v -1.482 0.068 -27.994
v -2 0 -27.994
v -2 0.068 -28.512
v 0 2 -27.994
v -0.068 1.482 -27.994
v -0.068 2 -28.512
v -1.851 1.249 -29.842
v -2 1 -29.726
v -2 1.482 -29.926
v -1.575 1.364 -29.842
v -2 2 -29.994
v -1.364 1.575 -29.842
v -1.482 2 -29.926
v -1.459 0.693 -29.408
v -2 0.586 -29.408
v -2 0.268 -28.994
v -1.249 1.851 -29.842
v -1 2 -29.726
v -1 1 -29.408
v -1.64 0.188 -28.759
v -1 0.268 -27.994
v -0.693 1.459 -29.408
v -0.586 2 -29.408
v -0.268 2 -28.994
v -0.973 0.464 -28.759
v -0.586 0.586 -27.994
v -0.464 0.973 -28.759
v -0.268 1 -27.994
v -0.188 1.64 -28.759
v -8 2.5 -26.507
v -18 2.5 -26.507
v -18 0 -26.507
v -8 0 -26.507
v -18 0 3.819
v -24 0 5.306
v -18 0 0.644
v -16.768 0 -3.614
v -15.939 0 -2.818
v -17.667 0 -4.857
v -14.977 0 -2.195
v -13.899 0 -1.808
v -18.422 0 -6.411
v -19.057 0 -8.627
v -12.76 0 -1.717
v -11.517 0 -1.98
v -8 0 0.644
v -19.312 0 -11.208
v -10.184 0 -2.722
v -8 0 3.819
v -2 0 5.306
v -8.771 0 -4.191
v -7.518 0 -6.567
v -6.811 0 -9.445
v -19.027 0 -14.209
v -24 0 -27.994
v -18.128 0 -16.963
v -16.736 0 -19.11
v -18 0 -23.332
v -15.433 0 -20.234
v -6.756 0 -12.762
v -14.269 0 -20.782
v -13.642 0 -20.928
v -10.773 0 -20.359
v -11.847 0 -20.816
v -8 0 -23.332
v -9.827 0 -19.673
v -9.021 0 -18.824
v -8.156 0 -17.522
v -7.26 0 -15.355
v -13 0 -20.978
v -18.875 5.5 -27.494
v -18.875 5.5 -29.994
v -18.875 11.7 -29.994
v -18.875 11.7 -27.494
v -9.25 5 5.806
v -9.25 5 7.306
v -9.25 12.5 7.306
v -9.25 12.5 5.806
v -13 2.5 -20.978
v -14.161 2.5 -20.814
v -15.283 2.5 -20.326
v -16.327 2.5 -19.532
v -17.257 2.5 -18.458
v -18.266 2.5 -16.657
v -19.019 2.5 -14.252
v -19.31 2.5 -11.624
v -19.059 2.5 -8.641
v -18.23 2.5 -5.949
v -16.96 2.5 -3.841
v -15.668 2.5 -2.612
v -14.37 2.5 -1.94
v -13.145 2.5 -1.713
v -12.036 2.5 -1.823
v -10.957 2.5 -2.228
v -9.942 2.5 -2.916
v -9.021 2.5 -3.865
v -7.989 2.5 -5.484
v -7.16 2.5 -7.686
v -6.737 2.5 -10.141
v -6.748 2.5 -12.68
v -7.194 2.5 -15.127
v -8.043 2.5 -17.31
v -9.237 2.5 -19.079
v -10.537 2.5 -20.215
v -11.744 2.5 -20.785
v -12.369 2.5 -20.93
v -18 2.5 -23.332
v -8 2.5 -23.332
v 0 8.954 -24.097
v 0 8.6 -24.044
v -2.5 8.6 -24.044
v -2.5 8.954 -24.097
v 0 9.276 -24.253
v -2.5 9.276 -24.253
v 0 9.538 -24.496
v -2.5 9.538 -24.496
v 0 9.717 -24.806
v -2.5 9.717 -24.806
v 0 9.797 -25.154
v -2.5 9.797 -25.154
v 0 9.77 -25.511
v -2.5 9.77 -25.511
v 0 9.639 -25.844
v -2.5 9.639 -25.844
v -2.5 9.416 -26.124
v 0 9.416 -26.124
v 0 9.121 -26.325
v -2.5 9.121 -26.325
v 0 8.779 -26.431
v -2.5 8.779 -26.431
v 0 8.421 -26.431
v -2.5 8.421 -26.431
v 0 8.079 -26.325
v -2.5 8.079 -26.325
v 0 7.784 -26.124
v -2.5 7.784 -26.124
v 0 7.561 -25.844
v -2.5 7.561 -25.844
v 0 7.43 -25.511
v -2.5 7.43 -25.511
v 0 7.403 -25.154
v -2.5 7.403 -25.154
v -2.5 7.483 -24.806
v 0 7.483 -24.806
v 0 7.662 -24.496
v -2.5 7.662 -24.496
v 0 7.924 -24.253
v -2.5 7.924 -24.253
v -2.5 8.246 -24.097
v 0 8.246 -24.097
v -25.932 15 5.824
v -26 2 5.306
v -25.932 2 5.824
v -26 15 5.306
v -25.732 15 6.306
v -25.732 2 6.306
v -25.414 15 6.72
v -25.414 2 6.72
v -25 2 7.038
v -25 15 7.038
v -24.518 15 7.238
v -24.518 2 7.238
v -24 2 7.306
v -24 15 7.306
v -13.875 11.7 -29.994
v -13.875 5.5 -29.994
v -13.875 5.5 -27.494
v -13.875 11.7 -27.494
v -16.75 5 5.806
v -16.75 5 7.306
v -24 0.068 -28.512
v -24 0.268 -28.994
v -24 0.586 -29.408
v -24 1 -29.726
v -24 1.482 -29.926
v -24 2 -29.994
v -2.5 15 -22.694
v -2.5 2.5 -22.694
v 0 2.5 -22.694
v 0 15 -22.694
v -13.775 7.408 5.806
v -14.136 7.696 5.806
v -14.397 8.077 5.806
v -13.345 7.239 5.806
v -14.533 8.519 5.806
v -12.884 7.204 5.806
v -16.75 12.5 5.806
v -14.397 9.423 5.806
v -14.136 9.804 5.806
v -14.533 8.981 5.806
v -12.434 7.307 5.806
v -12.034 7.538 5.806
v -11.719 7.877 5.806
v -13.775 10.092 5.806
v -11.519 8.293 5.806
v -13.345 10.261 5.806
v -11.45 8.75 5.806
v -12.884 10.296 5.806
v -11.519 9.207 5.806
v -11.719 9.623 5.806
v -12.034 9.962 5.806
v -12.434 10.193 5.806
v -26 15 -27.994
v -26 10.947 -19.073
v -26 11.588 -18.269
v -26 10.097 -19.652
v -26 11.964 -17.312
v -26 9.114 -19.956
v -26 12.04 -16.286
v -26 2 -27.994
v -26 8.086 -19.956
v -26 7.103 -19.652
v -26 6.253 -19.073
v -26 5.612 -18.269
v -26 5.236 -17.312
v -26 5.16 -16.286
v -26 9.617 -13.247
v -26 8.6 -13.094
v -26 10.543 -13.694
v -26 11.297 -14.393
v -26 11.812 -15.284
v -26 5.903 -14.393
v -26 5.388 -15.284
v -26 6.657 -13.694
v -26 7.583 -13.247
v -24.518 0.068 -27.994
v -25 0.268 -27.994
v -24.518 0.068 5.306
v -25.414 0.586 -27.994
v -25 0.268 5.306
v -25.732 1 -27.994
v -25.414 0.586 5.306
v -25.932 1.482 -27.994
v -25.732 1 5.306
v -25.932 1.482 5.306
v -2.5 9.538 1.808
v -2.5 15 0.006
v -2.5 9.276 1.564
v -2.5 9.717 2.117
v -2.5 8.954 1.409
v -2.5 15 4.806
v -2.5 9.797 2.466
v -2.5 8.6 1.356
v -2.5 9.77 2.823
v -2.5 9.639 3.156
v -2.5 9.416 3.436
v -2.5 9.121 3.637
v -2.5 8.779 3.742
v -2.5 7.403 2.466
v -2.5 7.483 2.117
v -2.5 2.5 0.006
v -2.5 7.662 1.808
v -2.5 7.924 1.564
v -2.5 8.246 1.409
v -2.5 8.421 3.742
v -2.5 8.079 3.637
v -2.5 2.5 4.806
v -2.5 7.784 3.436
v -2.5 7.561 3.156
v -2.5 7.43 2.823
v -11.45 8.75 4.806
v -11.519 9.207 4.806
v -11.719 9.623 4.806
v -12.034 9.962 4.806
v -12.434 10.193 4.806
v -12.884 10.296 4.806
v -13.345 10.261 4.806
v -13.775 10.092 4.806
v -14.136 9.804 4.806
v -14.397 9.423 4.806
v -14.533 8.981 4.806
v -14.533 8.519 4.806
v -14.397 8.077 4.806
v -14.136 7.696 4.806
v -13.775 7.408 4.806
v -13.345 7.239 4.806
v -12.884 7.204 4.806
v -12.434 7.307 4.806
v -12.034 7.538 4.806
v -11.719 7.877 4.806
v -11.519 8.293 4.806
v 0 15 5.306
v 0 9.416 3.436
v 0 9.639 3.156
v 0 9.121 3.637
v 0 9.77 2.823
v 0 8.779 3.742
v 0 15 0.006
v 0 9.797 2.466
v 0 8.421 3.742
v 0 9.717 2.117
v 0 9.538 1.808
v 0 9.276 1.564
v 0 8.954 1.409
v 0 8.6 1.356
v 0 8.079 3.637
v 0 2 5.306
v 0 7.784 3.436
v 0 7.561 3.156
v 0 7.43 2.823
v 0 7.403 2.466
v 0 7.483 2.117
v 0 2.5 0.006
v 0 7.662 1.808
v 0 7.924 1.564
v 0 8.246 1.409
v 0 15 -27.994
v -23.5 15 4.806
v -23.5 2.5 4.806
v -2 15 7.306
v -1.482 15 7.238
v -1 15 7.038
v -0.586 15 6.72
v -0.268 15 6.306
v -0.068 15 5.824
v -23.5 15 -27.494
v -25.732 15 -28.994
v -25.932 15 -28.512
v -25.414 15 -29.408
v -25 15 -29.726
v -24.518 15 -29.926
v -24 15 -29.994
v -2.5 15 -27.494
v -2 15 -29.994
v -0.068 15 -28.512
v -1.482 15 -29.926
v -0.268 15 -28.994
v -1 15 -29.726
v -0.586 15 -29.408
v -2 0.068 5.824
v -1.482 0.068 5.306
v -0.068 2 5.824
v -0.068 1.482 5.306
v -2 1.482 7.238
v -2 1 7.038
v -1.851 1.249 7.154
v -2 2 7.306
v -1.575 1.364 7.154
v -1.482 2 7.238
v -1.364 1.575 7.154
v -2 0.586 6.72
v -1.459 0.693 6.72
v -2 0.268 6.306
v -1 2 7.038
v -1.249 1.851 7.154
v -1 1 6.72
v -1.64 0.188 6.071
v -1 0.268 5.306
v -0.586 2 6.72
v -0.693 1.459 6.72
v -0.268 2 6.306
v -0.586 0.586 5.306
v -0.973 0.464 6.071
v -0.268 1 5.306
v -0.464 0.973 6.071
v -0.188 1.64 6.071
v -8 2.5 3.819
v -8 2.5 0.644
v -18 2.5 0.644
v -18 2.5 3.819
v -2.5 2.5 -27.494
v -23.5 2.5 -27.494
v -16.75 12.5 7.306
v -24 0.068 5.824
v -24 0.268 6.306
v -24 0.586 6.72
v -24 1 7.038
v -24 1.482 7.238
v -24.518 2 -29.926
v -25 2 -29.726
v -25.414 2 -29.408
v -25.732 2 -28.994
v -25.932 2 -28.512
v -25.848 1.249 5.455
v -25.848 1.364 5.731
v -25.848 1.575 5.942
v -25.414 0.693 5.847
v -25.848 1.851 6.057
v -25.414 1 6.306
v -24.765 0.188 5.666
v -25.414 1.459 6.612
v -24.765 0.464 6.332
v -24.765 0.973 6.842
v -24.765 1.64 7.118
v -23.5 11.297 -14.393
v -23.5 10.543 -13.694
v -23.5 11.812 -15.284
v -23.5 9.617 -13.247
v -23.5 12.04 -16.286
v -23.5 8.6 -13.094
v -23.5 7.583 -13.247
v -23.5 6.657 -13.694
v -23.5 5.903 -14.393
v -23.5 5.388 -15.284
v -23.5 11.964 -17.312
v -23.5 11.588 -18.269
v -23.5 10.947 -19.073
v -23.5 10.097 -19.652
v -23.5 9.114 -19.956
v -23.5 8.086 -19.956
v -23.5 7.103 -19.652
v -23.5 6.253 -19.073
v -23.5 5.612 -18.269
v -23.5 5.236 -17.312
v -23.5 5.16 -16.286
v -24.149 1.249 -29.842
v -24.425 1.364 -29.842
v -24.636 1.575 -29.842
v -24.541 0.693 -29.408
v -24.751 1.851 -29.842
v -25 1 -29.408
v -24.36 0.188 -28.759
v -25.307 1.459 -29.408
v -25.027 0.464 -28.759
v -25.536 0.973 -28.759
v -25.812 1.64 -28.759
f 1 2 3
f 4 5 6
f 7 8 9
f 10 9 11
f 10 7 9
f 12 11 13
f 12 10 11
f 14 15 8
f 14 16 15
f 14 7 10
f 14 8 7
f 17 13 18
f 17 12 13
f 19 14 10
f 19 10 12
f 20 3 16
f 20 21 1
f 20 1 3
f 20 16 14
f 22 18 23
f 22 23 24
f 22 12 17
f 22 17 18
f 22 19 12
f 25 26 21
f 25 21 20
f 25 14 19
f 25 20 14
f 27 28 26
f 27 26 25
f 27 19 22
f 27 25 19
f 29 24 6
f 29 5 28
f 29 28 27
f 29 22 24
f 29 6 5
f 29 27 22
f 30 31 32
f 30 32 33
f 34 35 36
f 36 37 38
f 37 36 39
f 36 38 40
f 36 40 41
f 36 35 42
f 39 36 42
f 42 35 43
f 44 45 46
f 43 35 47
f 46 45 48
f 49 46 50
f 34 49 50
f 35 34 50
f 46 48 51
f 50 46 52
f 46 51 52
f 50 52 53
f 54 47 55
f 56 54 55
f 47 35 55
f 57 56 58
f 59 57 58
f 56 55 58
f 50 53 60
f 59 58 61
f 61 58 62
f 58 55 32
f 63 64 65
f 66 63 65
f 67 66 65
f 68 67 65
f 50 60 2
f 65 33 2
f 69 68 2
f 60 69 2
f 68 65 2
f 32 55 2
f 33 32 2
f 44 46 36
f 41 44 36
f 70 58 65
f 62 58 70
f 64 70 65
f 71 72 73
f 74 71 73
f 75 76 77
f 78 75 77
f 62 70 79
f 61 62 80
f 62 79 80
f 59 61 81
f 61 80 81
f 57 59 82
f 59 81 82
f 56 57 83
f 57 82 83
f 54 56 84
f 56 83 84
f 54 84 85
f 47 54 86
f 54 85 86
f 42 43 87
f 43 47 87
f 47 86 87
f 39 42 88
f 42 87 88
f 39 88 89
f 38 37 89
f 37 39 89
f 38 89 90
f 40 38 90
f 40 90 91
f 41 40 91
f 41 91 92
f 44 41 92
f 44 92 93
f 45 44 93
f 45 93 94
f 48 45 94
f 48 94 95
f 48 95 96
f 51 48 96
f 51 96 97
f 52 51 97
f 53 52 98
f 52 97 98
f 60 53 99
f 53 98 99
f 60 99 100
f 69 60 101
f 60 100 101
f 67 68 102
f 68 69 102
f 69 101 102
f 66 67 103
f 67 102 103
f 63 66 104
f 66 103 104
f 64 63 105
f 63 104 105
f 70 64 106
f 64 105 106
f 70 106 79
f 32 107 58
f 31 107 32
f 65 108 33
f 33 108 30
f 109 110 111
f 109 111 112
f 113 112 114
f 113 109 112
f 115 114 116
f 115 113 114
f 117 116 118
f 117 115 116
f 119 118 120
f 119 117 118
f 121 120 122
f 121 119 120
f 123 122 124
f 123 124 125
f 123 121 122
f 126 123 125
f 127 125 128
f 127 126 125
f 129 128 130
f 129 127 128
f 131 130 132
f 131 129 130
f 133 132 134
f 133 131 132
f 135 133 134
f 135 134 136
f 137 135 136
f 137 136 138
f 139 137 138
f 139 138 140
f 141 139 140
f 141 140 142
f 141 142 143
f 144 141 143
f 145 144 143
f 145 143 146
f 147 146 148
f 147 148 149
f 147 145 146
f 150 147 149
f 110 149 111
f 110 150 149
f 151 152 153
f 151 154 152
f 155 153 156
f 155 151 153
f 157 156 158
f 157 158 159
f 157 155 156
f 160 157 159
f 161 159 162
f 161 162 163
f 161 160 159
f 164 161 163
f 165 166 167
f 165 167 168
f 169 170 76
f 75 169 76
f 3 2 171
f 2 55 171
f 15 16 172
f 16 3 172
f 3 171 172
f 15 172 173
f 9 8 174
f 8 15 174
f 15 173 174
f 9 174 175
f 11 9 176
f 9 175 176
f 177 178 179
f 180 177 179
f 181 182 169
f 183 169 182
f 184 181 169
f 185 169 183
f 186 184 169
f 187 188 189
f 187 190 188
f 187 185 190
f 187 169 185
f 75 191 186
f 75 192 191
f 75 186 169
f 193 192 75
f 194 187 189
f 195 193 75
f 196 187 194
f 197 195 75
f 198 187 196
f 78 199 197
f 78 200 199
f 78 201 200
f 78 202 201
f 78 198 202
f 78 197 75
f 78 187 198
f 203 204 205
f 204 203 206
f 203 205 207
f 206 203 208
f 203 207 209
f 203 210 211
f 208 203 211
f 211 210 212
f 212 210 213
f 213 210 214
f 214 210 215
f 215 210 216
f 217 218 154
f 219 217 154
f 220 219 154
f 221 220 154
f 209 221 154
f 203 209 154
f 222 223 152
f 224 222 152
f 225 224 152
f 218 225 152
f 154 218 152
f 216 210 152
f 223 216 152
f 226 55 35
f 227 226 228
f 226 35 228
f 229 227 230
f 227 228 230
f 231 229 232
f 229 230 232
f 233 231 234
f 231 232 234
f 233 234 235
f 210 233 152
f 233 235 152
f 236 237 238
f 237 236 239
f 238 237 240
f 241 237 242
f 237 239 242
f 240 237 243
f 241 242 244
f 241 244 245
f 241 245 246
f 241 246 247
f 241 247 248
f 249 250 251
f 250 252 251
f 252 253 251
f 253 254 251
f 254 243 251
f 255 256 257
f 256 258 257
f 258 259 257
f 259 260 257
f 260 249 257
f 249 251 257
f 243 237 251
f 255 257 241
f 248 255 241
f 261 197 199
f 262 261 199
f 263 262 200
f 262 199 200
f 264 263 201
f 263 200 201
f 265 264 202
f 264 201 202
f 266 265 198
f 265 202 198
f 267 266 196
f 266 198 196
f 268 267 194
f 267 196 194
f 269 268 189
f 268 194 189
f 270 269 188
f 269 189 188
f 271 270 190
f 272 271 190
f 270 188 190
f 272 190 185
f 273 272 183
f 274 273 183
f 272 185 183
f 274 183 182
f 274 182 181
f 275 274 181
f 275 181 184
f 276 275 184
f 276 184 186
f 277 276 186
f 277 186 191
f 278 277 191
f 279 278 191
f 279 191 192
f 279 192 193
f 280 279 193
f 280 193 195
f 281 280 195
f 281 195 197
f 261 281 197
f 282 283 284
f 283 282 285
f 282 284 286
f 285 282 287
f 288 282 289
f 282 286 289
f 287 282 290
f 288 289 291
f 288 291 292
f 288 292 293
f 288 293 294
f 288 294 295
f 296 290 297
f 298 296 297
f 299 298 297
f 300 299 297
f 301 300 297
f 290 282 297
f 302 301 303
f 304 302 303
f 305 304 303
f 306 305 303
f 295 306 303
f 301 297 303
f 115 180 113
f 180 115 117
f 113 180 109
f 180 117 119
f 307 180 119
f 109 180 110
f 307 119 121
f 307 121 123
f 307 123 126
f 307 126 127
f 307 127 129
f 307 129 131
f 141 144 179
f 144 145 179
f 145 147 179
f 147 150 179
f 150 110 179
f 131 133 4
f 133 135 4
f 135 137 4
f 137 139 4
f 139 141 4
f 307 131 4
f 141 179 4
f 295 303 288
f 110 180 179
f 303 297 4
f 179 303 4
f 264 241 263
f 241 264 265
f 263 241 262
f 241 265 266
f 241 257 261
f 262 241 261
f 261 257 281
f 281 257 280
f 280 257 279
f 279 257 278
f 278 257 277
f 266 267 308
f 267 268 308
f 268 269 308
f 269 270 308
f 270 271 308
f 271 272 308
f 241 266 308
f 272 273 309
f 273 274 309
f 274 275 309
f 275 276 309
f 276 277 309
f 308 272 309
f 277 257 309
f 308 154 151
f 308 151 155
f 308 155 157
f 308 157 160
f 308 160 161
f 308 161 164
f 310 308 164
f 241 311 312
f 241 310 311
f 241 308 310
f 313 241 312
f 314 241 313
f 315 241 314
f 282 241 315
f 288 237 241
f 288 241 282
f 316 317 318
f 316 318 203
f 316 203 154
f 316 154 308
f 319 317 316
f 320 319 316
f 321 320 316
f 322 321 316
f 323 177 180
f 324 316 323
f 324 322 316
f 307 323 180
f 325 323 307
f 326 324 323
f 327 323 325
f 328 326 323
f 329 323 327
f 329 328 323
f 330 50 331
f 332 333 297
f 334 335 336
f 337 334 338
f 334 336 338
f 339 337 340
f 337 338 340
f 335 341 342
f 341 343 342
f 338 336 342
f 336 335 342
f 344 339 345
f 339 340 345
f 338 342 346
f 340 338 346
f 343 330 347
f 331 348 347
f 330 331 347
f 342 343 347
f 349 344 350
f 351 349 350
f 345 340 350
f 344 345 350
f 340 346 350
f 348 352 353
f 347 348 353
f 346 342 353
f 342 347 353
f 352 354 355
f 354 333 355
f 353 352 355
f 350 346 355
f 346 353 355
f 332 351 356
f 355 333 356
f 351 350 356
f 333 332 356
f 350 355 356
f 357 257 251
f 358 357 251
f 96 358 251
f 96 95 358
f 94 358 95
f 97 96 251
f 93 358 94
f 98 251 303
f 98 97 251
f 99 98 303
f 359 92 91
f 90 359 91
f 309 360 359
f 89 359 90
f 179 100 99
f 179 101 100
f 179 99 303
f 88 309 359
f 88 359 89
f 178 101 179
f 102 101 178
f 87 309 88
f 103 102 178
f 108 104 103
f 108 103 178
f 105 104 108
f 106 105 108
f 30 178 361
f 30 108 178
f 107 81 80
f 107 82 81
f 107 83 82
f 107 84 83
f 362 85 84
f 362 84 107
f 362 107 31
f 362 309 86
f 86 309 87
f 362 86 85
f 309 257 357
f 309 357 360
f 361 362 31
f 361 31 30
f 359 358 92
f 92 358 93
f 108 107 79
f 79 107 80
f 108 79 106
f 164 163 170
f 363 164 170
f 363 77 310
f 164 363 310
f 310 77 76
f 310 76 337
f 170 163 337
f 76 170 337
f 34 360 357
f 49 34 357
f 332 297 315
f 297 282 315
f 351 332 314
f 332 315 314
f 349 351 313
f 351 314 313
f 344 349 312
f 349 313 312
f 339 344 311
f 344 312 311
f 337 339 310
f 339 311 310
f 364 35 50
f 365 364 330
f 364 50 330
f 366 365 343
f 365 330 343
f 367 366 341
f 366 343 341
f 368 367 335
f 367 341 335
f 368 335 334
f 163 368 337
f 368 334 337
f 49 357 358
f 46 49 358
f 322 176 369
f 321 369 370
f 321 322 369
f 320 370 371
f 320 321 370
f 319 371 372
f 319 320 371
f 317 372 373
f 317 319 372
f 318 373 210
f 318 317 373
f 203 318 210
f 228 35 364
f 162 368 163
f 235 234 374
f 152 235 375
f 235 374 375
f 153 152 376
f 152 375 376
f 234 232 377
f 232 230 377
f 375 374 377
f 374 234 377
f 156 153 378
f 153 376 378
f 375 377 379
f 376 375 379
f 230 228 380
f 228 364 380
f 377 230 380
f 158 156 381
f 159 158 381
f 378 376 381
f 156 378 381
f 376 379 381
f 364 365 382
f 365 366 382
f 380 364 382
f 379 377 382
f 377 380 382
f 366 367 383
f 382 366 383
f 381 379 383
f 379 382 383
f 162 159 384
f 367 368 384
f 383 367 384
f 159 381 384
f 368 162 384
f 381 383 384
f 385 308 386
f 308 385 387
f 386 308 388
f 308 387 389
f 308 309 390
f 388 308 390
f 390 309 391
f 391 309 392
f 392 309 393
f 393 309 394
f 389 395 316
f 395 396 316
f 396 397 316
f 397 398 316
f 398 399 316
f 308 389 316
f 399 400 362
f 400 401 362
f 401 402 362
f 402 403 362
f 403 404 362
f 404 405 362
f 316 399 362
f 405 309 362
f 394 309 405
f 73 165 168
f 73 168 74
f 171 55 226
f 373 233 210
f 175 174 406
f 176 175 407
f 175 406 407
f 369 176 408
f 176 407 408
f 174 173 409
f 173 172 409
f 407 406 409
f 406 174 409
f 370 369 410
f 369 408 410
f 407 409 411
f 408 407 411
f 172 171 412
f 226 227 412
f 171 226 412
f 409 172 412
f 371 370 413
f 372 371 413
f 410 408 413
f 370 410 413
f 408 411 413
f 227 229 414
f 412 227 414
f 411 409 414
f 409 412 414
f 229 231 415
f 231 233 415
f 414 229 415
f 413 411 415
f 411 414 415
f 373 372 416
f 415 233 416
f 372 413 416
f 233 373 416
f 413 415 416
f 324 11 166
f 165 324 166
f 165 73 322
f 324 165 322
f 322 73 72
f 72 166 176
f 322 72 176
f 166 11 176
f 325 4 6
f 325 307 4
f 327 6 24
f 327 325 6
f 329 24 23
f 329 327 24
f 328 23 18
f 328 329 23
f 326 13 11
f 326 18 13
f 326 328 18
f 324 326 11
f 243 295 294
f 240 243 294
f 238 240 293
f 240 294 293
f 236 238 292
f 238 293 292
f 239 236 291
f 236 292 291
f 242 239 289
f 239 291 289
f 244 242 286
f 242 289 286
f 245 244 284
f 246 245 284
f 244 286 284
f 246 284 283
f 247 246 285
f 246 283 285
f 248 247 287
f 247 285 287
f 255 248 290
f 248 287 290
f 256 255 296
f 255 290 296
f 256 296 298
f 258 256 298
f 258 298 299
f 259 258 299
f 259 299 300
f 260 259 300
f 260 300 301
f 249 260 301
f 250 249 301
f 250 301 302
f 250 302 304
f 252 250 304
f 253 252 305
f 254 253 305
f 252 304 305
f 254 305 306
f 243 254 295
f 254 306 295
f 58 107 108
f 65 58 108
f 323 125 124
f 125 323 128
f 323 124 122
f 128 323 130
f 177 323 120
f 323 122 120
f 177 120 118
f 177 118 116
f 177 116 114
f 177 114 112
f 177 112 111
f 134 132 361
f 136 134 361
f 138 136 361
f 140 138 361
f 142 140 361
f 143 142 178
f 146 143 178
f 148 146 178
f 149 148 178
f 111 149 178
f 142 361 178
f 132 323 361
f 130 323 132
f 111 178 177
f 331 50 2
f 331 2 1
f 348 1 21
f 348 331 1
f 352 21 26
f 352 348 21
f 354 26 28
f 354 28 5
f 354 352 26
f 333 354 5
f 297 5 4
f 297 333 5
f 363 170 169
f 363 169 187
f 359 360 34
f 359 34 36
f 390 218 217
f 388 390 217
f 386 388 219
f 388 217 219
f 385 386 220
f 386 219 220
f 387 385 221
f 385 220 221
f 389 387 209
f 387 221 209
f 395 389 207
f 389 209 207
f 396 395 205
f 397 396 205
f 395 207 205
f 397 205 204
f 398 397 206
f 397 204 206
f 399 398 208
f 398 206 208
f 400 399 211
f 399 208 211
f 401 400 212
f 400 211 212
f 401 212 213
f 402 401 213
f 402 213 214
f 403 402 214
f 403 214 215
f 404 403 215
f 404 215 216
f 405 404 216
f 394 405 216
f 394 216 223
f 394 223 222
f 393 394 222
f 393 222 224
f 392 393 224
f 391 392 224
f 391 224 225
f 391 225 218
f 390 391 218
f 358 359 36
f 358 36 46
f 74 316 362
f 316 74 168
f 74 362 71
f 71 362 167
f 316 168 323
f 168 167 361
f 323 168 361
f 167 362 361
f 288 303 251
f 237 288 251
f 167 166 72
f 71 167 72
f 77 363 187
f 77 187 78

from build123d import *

# Parameters (mm, degrees)
BOSS_EXTRUDE1_DEPTH = 15
SKETCH2_W           = 32.3
SKETCH2_H           = 2.5
BOSS_EXTRUDE2_DEPTH = 23.5
SKETCH3_W           = 5
SKETCH3_H           = 6.2
CUT_EXTRUDE1_DEPTH  = 12.5
CUT_EXTRUDE2_REACH  = 28
SKETCH4_R           = 3.45
SKETCH5_R           = 1.2
CUT_EXTRUDE3_DEPTH  = 2.5
CUT_EXTRUDE4_REACH  = 39.3
SKETCH6_R           = 1.55
FILLET2_R           = 2
SKETCH7_W           = 7.5
SKETCH7_H           = 7.5
SKETCH7_R           = 1.55
CUT_EXTRUDE5_DEPTH  = 1.5
CUT_EXTRUDE6_REACH  = 4.5
SKETCH8_RX          = 9.634046057
SKETCH8_RY          = 6.312870092
SKETCH8_W           = 10
SKETCH8_H           = 3.175


with BuildPart() as part:
    # Sketch1 → Boss-Extrude1 (new body)
    with BuildSketch(Plane(origin=(0, 0, 0), x_dir=(1, 0, 0), z_dir=(0, 1, 0))):
        Polygon((0, 29.994099724), (-26, 29.994099724), (-26, -7.305900276), (0, -7.305900276), (0, -0.005900276), (-2.5, -0.005900276), (-2.5, -4.805900276), (-23.5, -4.805900276), (-23.5, 27.494099724), (-2.5, 27.494099724), (-2.5, 22.694099724), (0, 22.694099724), align=None)
    extrude(amount=BOSS_EXTRUDE1_DEPTH)

    # Sketch2 → Boss-Extrude2 (add, through all)
    with BuildSketch(Plane(origin=(-23.5, 0, 0), x_dir=(0, 0, -1), z_dir=(1, 0, 0))):
        with Locations((11.344099724, 1.25)):
            Rectangle(SKETCH2_W, SKETCH2_H)
    extrude(amount=BOSS_EXTRUDE2_DEPTH)

    # Sketch3 → Cut-Extrude1 (cut)
    with BuildSketch(Plane(origin=(0, 0, -29.994099724), x_dir=(-1, 0, 0), z_dir=(0, 0, -1))):
        with Locations((16.375, 8.6)):
            Rectangle(SKETCH3_W, SKETCH3_H)
    extrude(amount=-CUT_EXTRUDE1_DEPTH, mode=Mode.SUBTRACT)

    # Sketch4 → Cut-Extrude2 (cut, up to next)
    with BuildSketch(Plane.ZY.offset(26), mode=Mode.PRIVATE) as cut_extrude2_sk1:
        with Locations((-16.544099724, 8.6)):
            Circle(SKETCH4_R)
    cut_extrude2_tool1 = extrude(cut_extrude2_sk1.sketch, amount=-CUT_EXTRUDE2_REACH, mode=Mode.PRIVATE) & part.part
    add(cut_extrude2_tool1.solids().sort_by_distance((-26, 8.6, -16.5441))[0], mode=Mode.SUBTRACT)

    # Sketch5 → Cut-Extrude3 (cut)
    with BuildSketch(Plane(origin=(0, 0, 0), x_dir=(0, 0, -1), z_dir=(1, 0, 0))):
        with Locations((-2.555900276, 8.6)):
            Circle(SKETCH5_R)
    cut_extrude3 = extrude(amount=-CUT_EXTRUDE3_DEPTH, mode=Mode.SUBTRACT)

    # Mirror1: Cut-Extrude3 across plane
    add(cut_extrude3.mirror(Plane.XY.offset(-11.344099724)), mode=Mode.SUBTRACT)

    # Sketch6 → Cut-Extrude4 (cut, up to next)
    with BuildSketch(Plane.XY.offset(7.305900276), mode=Mode.PRIVATE) as cut_extrude4_sk1:
        with Locations((-13, 8.75)):
            Circle(SKETCH6_R)
    cut_extrude4_tool1 = extrude(cut_extrude4_sk1.sketch, amount=-CUT_EXTRUDE4_REACH, mode=Mode.PRIVATE) & part.part
    add(cut_extrude4_tool1.solids().sort_by_distance((-13, 8.75, 7.3059))[0], mode=Mode.SUBTRACT)

    # Fillet2
    fillet2_edges = [part.edges().sort_by_distance(p)[0] for p in [
        (0, 0, -11.344099724),
        (-13, 0, 7.305900276),
        (-26, 0, -11.344099724),
        (-13, 0, -29.994099724),
        (0, 7.5, 7.305900276),
        (-26, 7.5, 7.305900276),
        (-26, 7.5, -29.994099724),
        (0, 7.5, -29.994099724),
    ]]
    fillet(fillet2_edges, radius=FILLET2_R)

    # Sketch7 → Cut-Extrude5 (cut)
    with BuildSketch(Plane.XY.offset(7.305900276)):
        with Locations((-13, 8.75)):
            Rectangle(SKETCH7_W, SKETCH7_H)
        with Locations((-13, 8.75)):
            Circle(SKETCH7_R, mode=Mode.SUBTRACT)
    extrude(amount=-CUT_EXTRUDE5_DEPTH, mode=Mode.SUBTRACT)

    # Sketch8 → Cut-Extrude6 (cut, up to next)
    with BuildSketch(Plane(origin=(0, 2.5, 0), x_dir=(1, 0, 0), z_dir=(0, 1, 0)), mode=Mode.PRIVATE) as cut_extrude6_sk1:
        with Locations(Location((-13, 11.344099724), (0, 0, 90))):
            Ellipse(SKETCH8_RX, SKETCH8_RY)
    cut_extrude6_tool1 = extrude(cut_extrude6_sk1.sketch, amount=-CUT_EXTRUDE6_REACH, mode=Mode.PRIVATE) & part.part
    add(cut_extrude6_tool1.solids().sort_by_distance((-13, 2.5, -11.3441))[0], mode=Mode.SUBTRACT)
    # Sketch8 → Cut-Extrude6 (cut, up to next)
    with BuildSketch(Plane(origin=(0, 2.5, 0), x_dir=(1, 0, 0), z_dir=(0, 1, 0)), mode=Mode.PRIVATE) as cut_extrude6_sk2:
        with Locations((-13, -2.231384095)):
            Rectangle(SKETCH8_W, SKETCH8_H)
    cut_extrude6_tool2 = extrude(cut_extrude6_sk2.sketch, amount=-CUT_EXTRUDE6_REACH, mode=Mode.PRIVATE) & part.part
    add(cut_extrude6_tool2.solids().sort_by_distance((-13, 2.5, 2.231384))[0], mode=Mode.SUBTRACT)
    # Sketch8 → Cut-Extrude6 (cut, up to next)
    with BuildSketch(Plane(origin=(0, 2.5, 0), x_dir=(1, 0, 0), z_dir=(0, 1, 0)), mode=Mode.PRIVATE) as cut_extrude6_sk3:
        with Locations((-13, 24.919583542)):
            Rectangle(SKETCH8_W, SKETCH8_H)
    cut_extrude6_tool3 = extrude(cut_extrude6_sk3.sketch, amount=-CUT_EXTRUDE6_REACH, mode=Mode.PRIVATE) & part.part
    add(cut_extrude6_tool3.solids().sort_by_distance((-13, 2.5, -24.919584))[0], mode=Mode.SUBTRACT)


solid = part.part
